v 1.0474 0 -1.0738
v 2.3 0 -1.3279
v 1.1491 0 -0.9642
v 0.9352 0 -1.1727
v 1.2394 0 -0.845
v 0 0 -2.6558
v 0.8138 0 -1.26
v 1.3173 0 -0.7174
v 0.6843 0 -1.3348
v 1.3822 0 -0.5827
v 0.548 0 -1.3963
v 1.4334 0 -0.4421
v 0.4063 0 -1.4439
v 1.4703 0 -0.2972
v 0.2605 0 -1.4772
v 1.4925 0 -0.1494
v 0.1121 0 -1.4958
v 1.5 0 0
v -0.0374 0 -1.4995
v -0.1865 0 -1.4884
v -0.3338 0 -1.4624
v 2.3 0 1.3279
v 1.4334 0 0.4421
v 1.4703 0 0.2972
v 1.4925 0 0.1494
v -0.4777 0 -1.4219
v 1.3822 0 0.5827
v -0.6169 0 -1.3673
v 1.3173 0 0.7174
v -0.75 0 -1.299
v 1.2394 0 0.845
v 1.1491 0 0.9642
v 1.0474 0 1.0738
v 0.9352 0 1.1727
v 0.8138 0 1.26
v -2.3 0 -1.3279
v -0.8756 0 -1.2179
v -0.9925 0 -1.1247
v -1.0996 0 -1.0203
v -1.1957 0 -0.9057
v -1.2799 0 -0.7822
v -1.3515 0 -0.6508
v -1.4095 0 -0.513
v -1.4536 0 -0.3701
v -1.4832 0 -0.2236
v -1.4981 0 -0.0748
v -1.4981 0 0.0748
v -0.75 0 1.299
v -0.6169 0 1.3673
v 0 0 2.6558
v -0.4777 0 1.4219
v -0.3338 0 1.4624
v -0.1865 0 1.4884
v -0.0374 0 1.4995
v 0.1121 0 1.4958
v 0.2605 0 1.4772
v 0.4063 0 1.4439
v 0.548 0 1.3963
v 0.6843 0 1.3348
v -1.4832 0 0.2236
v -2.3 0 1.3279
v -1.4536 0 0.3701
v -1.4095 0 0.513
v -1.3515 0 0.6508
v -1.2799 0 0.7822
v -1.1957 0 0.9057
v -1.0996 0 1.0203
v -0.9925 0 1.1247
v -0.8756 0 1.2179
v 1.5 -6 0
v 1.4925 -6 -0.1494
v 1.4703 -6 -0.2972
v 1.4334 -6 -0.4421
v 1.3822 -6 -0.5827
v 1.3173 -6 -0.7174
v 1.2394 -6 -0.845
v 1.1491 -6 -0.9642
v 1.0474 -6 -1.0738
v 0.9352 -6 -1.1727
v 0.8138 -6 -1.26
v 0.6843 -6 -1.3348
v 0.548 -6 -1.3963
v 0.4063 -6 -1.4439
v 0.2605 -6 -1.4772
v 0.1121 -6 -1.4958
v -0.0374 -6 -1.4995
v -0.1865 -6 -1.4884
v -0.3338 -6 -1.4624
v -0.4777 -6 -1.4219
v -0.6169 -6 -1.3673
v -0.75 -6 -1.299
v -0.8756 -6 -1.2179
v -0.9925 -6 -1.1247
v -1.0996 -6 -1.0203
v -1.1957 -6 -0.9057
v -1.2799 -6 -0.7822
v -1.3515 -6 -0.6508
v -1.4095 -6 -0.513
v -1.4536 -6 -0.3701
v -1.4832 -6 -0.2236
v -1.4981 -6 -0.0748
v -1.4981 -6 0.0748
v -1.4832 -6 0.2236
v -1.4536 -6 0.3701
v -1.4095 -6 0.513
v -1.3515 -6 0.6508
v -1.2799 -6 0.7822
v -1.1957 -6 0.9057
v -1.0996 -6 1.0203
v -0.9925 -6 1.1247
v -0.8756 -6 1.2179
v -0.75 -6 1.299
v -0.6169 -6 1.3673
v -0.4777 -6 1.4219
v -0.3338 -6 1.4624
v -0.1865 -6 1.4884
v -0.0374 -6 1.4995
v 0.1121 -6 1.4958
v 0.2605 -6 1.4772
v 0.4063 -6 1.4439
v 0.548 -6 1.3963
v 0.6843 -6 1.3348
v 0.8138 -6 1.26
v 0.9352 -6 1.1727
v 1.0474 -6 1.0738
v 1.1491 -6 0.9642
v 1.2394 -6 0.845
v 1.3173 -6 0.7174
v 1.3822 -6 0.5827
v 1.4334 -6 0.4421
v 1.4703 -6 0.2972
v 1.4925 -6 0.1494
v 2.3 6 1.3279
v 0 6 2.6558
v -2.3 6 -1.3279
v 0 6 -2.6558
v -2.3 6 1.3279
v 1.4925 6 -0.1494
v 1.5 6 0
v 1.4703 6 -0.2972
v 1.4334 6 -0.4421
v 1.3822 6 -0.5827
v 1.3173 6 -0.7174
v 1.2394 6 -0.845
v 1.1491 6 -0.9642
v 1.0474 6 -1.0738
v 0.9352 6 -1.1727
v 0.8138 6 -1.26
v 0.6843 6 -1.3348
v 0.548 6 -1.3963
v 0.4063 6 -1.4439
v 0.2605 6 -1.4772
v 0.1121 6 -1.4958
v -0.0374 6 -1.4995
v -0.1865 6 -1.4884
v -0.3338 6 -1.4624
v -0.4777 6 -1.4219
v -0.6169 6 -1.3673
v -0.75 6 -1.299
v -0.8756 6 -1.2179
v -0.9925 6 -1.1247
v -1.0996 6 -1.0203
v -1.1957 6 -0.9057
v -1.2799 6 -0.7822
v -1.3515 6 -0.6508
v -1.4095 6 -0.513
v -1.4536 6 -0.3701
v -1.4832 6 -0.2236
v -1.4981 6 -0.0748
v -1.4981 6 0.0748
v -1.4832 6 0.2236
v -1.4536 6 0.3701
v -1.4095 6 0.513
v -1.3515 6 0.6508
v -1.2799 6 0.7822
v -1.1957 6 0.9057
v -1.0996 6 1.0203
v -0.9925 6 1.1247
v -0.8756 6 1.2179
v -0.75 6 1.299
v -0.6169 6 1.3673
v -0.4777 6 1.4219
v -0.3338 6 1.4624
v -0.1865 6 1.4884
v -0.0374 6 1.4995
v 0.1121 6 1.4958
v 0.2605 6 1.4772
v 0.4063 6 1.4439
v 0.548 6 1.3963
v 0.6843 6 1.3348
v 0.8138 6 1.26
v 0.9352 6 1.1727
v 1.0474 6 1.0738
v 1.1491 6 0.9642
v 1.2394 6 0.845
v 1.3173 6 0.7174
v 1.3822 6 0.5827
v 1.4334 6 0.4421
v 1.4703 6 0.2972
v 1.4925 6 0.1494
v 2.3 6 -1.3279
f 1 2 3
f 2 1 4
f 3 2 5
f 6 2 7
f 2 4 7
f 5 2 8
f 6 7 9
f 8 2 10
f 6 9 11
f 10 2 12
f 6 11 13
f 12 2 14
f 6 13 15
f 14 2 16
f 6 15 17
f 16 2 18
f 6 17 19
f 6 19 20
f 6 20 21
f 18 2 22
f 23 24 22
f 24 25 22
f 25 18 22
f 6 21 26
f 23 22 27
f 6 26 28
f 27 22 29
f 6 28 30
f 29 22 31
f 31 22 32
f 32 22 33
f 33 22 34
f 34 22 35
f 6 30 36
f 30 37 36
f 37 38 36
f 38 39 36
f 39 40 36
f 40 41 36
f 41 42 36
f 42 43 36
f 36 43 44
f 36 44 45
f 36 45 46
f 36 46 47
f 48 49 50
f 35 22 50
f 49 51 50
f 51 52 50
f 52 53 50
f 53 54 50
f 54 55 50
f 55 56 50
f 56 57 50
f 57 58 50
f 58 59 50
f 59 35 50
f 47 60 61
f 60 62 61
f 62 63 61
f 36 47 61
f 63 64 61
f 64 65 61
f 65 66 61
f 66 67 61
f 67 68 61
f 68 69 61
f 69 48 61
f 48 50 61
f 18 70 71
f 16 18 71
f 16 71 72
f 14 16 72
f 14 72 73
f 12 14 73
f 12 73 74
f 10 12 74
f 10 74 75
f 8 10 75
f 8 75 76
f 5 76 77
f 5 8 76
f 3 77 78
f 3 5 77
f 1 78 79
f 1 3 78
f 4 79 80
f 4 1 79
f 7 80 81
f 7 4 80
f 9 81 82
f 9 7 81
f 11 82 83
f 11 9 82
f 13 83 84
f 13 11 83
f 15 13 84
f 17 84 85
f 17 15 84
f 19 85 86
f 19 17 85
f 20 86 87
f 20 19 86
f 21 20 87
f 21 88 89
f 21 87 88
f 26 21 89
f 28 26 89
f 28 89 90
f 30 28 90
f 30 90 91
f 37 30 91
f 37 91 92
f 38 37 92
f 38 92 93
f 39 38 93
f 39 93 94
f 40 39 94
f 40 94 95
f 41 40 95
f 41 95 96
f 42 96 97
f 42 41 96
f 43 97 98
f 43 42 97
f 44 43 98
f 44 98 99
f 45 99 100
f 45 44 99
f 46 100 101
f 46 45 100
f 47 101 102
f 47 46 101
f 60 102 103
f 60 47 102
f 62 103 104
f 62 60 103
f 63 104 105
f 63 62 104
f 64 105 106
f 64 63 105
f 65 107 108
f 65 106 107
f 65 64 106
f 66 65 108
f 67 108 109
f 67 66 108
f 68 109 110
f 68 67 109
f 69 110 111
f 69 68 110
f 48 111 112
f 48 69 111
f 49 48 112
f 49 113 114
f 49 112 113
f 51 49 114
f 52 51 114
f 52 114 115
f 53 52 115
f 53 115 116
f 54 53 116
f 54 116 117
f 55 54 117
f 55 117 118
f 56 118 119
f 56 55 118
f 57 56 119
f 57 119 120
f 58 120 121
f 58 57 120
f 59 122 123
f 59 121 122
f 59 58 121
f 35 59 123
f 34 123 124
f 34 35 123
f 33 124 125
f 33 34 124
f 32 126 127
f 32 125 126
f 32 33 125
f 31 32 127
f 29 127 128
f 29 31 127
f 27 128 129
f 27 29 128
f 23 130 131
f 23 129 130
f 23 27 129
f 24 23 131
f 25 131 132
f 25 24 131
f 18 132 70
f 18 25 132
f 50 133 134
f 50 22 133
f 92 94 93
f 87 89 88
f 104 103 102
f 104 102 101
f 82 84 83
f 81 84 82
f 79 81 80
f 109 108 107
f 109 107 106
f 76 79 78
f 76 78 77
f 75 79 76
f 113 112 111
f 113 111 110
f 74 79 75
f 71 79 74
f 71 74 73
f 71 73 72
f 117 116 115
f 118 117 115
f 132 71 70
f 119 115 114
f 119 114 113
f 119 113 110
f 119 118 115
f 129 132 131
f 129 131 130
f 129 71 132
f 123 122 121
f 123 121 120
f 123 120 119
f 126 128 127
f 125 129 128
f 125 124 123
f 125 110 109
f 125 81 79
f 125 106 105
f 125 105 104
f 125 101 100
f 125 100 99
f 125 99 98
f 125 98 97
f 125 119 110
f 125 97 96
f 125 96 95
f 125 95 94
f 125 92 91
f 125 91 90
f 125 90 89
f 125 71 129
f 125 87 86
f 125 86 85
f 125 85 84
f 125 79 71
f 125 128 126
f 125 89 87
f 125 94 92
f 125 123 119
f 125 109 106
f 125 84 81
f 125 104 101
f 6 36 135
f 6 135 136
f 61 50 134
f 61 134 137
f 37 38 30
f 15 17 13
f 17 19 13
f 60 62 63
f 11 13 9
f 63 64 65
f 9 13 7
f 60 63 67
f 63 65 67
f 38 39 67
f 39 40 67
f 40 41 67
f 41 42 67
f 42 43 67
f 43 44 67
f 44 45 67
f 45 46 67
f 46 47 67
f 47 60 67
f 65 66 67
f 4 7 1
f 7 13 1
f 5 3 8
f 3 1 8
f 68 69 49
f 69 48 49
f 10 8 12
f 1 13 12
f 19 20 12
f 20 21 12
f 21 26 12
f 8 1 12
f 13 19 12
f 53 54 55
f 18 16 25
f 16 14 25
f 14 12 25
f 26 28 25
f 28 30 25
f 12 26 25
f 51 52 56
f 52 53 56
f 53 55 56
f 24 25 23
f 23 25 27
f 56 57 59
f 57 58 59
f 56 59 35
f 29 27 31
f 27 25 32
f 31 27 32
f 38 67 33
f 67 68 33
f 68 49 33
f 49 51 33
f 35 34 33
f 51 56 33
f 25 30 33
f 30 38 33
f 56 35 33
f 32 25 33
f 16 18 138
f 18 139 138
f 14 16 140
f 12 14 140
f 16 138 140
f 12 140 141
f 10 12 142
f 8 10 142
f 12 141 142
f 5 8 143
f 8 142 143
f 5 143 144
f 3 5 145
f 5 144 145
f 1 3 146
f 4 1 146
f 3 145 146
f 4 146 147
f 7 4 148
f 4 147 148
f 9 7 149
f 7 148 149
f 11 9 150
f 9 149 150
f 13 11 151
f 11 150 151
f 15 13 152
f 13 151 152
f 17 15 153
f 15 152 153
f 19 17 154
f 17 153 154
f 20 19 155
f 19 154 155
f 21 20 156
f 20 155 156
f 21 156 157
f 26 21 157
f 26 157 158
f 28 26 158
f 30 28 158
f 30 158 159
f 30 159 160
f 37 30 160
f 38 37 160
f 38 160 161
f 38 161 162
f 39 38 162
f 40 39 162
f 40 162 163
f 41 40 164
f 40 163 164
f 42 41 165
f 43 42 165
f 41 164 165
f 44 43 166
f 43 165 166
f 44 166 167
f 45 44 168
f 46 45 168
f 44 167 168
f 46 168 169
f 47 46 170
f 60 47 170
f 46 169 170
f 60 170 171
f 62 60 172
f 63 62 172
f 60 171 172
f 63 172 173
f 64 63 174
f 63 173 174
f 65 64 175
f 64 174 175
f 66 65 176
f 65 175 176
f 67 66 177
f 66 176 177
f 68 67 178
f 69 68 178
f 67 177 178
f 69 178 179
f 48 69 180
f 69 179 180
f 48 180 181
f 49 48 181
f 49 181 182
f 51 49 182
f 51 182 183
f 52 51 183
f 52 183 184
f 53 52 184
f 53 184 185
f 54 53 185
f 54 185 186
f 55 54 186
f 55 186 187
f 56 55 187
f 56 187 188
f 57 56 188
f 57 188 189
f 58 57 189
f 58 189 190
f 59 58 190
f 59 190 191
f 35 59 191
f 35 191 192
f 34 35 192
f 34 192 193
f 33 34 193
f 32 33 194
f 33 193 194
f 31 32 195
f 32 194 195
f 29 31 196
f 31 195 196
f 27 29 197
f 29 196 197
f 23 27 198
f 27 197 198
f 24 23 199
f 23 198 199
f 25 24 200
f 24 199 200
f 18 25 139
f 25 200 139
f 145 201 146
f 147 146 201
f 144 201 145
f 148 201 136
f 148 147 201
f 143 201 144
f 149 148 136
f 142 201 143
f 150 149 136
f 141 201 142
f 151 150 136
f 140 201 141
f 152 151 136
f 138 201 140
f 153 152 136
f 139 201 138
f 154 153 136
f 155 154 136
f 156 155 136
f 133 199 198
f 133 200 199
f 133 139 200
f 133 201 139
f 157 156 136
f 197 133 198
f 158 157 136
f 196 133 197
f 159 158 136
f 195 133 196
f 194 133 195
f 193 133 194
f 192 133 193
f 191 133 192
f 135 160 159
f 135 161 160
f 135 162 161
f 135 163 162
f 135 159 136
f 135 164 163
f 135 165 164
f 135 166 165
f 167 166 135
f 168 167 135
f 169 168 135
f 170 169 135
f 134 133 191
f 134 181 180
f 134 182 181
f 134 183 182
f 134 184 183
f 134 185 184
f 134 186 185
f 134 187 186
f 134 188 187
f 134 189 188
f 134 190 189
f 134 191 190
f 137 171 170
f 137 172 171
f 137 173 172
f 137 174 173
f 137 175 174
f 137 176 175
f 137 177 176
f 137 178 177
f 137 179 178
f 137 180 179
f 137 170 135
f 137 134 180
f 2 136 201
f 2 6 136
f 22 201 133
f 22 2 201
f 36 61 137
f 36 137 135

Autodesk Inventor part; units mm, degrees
ref_plane "YZ Plane" through (0, 0, 0) normal (1, 0, 0) x (0, 1, 0)
ref_plane "XZ Plane" through (0, 0, 0) normal (0, 1, 0) x (-1, 0, 0)
ref_plane "XY Plane" through (0, 0, 0) normal (0, 0, 1) x (1, 0, 0)
sketch "Sketch1" plane through (0, 0, 0) normal (0, 1, 0) x (-1, 0, 0)
  line L0 (0, -2.6558) -> (-2.3, -1.3279)
  line L1 (-2.3, -1.3279) -> (-2.3, 1.3279)
  line L2 (-2.3, 1.3279) -> (0, 2.6558)
  line L3 (0, 2.6558) -> (2.3, 1.3279)
  line L4 (2.3, 1.3279) -> (2.3, -1.3279)
  line L5 (2.3, -1.3279) -> (0, -2.6558)
  point P0 (0, 0)
  point P1 (0, 0)
  dimension "d0" = 4.6
extrude "Extrusion1" add sketch "Sketch1" along normal blind 6
sketch "Sketch2" plane through (0, 6, 0) normal (0, 1, 0) x (1, 0, 0)
  circle A0 centre (0, 0) radius 1.5
  dimension "d3" = 3
extrude "Extrusion2" cut sketch "Sketch2" against normal blind 15
sketch "Sketch3" plane through (0, 0, 0) normal (0, -1, 0) x (1, 0, 0)
  circle A0 centre (0, 0) radius 1.5
  dimension "d6" = 3
extrude "Extrusion3" add sketch "Sketch3" along normal blind 6
properties part number "M3_6_MM_STANDOFF_PIN"
